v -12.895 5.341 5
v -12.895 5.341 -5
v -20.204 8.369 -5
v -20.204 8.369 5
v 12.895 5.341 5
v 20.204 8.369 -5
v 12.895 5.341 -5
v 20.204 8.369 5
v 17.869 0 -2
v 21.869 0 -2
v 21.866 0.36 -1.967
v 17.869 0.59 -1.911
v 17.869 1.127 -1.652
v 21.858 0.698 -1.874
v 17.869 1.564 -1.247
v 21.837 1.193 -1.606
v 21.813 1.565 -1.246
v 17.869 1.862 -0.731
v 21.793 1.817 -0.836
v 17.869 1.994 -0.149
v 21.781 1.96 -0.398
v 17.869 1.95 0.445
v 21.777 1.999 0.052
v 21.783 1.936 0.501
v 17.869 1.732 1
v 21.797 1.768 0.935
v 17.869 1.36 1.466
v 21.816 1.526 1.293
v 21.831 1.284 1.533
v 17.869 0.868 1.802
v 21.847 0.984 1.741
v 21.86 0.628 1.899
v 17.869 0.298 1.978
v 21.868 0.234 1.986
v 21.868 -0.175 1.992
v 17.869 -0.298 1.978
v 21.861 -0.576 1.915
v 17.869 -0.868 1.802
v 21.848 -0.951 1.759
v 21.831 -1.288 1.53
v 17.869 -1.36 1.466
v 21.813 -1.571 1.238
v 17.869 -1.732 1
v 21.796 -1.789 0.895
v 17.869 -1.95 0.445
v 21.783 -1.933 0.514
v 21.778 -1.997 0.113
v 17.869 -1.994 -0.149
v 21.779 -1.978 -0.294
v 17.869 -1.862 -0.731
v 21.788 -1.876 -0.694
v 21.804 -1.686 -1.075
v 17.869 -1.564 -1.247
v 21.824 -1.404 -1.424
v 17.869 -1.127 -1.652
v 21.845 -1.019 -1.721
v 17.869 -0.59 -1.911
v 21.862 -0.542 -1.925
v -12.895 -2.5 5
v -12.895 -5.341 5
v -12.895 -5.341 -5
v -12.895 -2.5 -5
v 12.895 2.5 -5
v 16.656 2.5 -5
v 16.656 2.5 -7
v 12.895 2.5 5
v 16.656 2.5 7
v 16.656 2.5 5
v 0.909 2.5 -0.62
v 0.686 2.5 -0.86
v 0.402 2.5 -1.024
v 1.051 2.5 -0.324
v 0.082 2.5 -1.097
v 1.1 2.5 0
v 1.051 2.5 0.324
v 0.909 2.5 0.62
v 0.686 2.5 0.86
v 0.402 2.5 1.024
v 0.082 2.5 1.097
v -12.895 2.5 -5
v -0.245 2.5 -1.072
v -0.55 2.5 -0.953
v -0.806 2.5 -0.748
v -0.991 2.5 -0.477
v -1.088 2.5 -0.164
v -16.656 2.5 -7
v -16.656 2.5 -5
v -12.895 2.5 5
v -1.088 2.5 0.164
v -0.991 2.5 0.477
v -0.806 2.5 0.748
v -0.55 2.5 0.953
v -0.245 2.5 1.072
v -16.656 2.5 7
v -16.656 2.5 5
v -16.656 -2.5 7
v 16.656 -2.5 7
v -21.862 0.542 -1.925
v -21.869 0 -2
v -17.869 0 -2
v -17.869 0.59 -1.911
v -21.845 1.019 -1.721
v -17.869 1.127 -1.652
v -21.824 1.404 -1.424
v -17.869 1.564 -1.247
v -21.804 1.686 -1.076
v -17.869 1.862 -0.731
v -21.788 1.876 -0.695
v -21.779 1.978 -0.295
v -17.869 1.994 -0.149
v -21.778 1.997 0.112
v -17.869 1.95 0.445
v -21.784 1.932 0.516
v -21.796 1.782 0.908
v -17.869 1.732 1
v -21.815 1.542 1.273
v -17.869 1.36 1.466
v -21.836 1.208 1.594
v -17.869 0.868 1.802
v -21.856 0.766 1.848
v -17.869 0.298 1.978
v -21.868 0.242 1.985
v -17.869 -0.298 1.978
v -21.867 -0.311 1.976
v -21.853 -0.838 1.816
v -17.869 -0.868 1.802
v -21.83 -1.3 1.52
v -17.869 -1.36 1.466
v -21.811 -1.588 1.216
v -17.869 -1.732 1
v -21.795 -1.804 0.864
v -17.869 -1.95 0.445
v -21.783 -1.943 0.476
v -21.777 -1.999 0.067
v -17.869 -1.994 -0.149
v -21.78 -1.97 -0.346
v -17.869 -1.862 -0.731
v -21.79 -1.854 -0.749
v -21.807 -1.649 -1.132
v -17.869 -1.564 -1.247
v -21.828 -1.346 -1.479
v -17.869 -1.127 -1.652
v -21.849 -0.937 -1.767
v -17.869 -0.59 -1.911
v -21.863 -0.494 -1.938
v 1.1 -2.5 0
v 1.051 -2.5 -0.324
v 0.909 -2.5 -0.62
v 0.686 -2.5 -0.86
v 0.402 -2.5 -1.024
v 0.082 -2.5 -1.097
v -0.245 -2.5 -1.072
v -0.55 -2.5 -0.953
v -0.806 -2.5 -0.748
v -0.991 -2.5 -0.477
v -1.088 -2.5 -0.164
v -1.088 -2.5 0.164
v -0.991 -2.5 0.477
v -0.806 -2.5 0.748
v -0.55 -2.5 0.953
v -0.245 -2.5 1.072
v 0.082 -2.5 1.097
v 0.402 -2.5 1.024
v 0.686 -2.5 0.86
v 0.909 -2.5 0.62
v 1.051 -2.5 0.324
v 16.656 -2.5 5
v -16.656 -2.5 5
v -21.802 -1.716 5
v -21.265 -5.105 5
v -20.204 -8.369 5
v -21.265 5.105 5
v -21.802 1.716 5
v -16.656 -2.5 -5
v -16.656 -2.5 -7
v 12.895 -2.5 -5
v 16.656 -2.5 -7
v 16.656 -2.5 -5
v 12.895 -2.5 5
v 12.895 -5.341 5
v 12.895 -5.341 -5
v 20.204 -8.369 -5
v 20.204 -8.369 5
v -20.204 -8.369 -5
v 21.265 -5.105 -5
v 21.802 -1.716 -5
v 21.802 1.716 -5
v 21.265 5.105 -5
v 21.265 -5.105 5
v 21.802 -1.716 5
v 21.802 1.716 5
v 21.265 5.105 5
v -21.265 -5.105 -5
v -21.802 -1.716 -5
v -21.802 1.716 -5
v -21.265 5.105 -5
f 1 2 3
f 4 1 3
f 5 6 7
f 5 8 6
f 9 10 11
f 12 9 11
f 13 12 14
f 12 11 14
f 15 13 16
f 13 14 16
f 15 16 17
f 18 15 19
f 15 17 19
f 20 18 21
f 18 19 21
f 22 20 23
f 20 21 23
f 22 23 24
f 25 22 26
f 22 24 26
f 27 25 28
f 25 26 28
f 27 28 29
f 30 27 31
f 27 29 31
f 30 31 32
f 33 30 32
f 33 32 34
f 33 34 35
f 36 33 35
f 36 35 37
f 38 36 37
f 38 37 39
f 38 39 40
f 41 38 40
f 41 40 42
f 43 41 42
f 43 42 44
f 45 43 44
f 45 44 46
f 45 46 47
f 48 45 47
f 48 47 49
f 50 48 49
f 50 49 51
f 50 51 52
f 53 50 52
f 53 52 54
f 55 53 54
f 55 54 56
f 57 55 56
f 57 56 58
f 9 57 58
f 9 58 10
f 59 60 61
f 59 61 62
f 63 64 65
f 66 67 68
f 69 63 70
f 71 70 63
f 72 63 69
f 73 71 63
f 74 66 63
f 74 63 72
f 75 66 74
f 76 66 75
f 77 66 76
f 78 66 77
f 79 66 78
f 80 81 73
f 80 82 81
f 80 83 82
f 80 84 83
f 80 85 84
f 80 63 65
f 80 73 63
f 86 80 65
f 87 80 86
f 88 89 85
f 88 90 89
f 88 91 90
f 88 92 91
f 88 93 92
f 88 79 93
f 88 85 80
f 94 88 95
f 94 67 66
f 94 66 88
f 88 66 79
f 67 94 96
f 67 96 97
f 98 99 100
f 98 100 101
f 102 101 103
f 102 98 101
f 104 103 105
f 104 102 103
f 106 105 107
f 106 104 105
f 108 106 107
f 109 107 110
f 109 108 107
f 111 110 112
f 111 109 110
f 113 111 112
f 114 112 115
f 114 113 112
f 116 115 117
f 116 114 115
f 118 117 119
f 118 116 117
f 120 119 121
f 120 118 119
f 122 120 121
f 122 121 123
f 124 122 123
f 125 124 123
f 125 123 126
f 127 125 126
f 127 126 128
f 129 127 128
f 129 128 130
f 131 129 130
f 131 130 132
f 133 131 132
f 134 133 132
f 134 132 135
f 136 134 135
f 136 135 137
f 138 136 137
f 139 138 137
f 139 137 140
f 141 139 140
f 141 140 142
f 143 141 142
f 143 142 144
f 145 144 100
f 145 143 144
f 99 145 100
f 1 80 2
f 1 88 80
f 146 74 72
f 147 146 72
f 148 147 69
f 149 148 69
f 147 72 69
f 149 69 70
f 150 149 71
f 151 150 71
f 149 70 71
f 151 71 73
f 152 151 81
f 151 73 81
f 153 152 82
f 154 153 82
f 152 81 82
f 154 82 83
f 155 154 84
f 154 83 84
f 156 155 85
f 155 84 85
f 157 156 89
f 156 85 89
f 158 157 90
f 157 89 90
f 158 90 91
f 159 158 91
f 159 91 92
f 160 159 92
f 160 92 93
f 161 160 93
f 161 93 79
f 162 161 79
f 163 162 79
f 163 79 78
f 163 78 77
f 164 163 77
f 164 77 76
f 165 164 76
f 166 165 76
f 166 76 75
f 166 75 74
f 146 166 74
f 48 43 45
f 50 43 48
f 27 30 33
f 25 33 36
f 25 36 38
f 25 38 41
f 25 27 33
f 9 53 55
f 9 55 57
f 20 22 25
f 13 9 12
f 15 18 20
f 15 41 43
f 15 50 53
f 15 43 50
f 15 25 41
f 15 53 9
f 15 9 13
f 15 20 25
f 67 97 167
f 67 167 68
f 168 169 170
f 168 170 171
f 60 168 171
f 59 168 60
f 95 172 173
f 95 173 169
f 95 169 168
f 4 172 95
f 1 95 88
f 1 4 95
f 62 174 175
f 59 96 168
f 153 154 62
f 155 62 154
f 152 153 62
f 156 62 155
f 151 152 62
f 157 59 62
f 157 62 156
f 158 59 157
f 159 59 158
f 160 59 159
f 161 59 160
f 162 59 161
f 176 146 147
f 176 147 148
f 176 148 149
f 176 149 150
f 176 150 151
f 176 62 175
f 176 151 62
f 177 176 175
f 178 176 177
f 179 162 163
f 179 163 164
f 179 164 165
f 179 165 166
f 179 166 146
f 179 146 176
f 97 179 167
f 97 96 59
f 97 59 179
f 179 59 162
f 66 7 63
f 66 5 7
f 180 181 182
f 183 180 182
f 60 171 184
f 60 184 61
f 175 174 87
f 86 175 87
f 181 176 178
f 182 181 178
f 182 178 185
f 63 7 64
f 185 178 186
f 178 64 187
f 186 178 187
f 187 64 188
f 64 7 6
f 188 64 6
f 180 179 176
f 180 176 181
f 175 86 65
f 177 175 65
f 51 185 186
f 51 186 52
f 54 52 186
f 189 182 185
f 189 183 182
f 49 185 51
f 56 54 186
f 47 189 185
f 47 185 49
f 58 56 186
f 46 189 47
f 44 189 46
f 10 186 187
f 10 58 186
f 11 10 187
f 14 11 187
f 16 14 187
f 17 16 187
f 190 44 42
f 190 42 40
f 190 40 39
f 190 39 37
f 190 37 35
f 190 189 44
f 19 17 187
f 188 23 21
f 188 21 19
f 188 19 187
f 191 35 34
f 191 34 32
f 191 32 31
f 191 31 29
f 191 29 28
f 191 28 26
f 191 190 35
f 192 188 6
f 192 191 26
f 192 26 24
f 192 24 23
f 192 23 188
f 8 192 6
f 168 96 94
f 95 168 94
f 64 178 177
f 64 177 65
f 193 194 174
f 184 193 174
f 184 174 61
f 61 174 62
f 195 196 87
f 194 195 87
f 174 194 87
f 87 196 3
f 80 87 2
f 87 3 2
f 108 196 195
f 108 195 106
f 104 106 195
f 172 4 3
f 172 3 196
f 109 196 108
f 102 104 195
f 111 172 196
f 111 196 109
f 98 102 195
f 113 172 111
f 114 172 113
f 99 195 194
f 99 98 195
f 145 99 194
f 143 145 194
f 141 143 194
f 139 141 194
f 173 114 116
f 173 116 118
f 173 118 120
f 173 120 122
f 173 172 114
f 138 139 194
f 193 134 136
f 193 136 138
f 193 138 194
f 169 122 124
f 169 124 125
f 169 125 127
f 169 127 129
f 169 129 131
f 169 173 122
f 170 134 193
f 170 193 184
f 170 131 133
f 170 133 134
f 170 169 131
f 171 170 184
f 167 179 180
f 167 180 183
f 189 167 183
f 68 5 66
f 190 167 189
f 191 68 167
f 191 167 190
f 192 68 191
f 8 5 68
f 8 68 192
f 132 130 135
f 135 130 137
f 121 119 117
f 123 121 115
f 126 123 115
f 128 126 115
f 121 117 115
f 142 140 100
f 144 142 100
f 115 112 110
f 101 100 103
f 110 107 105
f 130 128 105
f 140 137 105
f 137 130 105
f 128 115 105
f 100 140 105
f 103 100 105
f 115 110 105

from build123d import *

# Parameters (mm, degrees)
BOSS_EXTRUDE1_DEPTH   = 5
BOSS_EXTRUDE1_2_DEPTH = 5
SKETCH1_3_W           = 33.311527072
SKETCH1_3_H           = 5
BOSS_EXTRUDE2_DEPTH   = 7
CUT_EXTRUDE1_REACH    = 27.404
SKETCH2_R             = 1.1
SKETCH3_R             = 2
CUT_EXTRUDE2_DEPTH    = 4


with BuildPart() as part:
    # Sketch1 → Boss-Extrude1 (new, symmetric)
    with BuildSketch(Plane.XY):
        with BuildLine():
            Line((-12.89486278, 5.341227048), (-20.204359293, 8.368919638))
            ThreePointArc((-20.204359293, 8.368919638), (-21.869040911, 0), (-20.204359293, -8.368919638))
            Line((-20.204359293, -8.368919638), (-12.89486278, -5.341227048))
            Line((-12.89486278, -5.341227048), (-12.89486278, -2.5))
            Line((-12.89486278, -2.5), (-16.655763536, -2.5))
            Line((-16.655763536, -2.5), (-16.655763536, 2.5))
            Line((-16.655763536, 2.5), (-12.89486278, 2.5))
            Line((-12.89486278, 2.5), (-12.89486278, 5.341227048))
        make_face()
    extrude(amount=BOSS_EXTRUDE1_DEPTH, both=True)



with BuildPart() as body_2:
    # Sketch1 → Boss-Extrude1 2 (new, symmetric)
    with BuildSketch(Plane.XY):
        with BuildLine():
            Line((12.89486278, 5.341227048), (12.89486278, 2.5))
            Line((12.89486278, 2.5), (16.655763536, 2.5))
            Line((16.655763536, 2.5), (16.655763536, -2.5))
            Line((16.655763536, -2.5), (12.89486278, -2.5))
            Line((12.89486278, -2.5), (12.89486278, -5.341227048))
            Line((12.89486278, -5.341227048), (20.204359293, -8.368919638))
            ThreePointArc((20.204359293, -8.368919638), (21.869040911, 0), (20.204359293, 8.368919638))
            Line((20.204359293, 8.368919638), (12.89486278, 5.341227048))
        make_face()
    extrude(amount=BOSS_EXTRUDE1_2_DEPTH, both=True)


with BuildPart() as part_1:
    add(part.part)

    add(body_2.part)  # Boss-Extrude2 merges body 2
    # Sketch1_3 → Boss-Extrude2 (add, symmetric)
    with BuildSketch(Plane.XY):
        Rectangle(SKETCH1_3_W, SKETCH1_3_H)
    extrude(amount=BOSS_EXTRUDE2_DEPTH, both=True)

    # Sketch2 → Cut-Extrude1 (cut, up to next)
    with BuildSketch(Plane(origin=(0, 2.5, 0), x_dir=(1, 0, 0), z_dir=(0, 1, 0)), mode=Mode.PRIVATE) as cut_extrude1_sk1:
        Circle(SKETCH2_R)
    cut_extrude1_tool1 = extrude(cut_extrude1_sk1.sketch, amount=-CUT_EXTRUDE1_REACH, mode=Mode.PRIVATE) & part_1.part
    add(cut_extrude1_tool1.solids().sort_by_distance((0, 2.5, 0))[0], mode=Mode.SUBTRACT)

    # Sketch3 → Cut-Extrude2 (cut)
    with BuildSketch(Plane(origin=(21.869040911, 0, 0), x_dir=(0, 0, -1), z_dir=(1, 0, 0))):
        Circle(SKETCH3_R)
    cut_extrude2 = extrude(amount=-CUT_EXTRUDE2_DEPTH, mode=Mode.SUBTRACT)

    # Mirror1: Cut-Extrude2 across plane
    add(cut_extrude2.mirror(Plane(origin=(0, 0, 0), x_dir=(0, 0, 1), z_dir=(1, 0, 0))), mode=Mode.SUBTRACT)


solid = part_1.part
